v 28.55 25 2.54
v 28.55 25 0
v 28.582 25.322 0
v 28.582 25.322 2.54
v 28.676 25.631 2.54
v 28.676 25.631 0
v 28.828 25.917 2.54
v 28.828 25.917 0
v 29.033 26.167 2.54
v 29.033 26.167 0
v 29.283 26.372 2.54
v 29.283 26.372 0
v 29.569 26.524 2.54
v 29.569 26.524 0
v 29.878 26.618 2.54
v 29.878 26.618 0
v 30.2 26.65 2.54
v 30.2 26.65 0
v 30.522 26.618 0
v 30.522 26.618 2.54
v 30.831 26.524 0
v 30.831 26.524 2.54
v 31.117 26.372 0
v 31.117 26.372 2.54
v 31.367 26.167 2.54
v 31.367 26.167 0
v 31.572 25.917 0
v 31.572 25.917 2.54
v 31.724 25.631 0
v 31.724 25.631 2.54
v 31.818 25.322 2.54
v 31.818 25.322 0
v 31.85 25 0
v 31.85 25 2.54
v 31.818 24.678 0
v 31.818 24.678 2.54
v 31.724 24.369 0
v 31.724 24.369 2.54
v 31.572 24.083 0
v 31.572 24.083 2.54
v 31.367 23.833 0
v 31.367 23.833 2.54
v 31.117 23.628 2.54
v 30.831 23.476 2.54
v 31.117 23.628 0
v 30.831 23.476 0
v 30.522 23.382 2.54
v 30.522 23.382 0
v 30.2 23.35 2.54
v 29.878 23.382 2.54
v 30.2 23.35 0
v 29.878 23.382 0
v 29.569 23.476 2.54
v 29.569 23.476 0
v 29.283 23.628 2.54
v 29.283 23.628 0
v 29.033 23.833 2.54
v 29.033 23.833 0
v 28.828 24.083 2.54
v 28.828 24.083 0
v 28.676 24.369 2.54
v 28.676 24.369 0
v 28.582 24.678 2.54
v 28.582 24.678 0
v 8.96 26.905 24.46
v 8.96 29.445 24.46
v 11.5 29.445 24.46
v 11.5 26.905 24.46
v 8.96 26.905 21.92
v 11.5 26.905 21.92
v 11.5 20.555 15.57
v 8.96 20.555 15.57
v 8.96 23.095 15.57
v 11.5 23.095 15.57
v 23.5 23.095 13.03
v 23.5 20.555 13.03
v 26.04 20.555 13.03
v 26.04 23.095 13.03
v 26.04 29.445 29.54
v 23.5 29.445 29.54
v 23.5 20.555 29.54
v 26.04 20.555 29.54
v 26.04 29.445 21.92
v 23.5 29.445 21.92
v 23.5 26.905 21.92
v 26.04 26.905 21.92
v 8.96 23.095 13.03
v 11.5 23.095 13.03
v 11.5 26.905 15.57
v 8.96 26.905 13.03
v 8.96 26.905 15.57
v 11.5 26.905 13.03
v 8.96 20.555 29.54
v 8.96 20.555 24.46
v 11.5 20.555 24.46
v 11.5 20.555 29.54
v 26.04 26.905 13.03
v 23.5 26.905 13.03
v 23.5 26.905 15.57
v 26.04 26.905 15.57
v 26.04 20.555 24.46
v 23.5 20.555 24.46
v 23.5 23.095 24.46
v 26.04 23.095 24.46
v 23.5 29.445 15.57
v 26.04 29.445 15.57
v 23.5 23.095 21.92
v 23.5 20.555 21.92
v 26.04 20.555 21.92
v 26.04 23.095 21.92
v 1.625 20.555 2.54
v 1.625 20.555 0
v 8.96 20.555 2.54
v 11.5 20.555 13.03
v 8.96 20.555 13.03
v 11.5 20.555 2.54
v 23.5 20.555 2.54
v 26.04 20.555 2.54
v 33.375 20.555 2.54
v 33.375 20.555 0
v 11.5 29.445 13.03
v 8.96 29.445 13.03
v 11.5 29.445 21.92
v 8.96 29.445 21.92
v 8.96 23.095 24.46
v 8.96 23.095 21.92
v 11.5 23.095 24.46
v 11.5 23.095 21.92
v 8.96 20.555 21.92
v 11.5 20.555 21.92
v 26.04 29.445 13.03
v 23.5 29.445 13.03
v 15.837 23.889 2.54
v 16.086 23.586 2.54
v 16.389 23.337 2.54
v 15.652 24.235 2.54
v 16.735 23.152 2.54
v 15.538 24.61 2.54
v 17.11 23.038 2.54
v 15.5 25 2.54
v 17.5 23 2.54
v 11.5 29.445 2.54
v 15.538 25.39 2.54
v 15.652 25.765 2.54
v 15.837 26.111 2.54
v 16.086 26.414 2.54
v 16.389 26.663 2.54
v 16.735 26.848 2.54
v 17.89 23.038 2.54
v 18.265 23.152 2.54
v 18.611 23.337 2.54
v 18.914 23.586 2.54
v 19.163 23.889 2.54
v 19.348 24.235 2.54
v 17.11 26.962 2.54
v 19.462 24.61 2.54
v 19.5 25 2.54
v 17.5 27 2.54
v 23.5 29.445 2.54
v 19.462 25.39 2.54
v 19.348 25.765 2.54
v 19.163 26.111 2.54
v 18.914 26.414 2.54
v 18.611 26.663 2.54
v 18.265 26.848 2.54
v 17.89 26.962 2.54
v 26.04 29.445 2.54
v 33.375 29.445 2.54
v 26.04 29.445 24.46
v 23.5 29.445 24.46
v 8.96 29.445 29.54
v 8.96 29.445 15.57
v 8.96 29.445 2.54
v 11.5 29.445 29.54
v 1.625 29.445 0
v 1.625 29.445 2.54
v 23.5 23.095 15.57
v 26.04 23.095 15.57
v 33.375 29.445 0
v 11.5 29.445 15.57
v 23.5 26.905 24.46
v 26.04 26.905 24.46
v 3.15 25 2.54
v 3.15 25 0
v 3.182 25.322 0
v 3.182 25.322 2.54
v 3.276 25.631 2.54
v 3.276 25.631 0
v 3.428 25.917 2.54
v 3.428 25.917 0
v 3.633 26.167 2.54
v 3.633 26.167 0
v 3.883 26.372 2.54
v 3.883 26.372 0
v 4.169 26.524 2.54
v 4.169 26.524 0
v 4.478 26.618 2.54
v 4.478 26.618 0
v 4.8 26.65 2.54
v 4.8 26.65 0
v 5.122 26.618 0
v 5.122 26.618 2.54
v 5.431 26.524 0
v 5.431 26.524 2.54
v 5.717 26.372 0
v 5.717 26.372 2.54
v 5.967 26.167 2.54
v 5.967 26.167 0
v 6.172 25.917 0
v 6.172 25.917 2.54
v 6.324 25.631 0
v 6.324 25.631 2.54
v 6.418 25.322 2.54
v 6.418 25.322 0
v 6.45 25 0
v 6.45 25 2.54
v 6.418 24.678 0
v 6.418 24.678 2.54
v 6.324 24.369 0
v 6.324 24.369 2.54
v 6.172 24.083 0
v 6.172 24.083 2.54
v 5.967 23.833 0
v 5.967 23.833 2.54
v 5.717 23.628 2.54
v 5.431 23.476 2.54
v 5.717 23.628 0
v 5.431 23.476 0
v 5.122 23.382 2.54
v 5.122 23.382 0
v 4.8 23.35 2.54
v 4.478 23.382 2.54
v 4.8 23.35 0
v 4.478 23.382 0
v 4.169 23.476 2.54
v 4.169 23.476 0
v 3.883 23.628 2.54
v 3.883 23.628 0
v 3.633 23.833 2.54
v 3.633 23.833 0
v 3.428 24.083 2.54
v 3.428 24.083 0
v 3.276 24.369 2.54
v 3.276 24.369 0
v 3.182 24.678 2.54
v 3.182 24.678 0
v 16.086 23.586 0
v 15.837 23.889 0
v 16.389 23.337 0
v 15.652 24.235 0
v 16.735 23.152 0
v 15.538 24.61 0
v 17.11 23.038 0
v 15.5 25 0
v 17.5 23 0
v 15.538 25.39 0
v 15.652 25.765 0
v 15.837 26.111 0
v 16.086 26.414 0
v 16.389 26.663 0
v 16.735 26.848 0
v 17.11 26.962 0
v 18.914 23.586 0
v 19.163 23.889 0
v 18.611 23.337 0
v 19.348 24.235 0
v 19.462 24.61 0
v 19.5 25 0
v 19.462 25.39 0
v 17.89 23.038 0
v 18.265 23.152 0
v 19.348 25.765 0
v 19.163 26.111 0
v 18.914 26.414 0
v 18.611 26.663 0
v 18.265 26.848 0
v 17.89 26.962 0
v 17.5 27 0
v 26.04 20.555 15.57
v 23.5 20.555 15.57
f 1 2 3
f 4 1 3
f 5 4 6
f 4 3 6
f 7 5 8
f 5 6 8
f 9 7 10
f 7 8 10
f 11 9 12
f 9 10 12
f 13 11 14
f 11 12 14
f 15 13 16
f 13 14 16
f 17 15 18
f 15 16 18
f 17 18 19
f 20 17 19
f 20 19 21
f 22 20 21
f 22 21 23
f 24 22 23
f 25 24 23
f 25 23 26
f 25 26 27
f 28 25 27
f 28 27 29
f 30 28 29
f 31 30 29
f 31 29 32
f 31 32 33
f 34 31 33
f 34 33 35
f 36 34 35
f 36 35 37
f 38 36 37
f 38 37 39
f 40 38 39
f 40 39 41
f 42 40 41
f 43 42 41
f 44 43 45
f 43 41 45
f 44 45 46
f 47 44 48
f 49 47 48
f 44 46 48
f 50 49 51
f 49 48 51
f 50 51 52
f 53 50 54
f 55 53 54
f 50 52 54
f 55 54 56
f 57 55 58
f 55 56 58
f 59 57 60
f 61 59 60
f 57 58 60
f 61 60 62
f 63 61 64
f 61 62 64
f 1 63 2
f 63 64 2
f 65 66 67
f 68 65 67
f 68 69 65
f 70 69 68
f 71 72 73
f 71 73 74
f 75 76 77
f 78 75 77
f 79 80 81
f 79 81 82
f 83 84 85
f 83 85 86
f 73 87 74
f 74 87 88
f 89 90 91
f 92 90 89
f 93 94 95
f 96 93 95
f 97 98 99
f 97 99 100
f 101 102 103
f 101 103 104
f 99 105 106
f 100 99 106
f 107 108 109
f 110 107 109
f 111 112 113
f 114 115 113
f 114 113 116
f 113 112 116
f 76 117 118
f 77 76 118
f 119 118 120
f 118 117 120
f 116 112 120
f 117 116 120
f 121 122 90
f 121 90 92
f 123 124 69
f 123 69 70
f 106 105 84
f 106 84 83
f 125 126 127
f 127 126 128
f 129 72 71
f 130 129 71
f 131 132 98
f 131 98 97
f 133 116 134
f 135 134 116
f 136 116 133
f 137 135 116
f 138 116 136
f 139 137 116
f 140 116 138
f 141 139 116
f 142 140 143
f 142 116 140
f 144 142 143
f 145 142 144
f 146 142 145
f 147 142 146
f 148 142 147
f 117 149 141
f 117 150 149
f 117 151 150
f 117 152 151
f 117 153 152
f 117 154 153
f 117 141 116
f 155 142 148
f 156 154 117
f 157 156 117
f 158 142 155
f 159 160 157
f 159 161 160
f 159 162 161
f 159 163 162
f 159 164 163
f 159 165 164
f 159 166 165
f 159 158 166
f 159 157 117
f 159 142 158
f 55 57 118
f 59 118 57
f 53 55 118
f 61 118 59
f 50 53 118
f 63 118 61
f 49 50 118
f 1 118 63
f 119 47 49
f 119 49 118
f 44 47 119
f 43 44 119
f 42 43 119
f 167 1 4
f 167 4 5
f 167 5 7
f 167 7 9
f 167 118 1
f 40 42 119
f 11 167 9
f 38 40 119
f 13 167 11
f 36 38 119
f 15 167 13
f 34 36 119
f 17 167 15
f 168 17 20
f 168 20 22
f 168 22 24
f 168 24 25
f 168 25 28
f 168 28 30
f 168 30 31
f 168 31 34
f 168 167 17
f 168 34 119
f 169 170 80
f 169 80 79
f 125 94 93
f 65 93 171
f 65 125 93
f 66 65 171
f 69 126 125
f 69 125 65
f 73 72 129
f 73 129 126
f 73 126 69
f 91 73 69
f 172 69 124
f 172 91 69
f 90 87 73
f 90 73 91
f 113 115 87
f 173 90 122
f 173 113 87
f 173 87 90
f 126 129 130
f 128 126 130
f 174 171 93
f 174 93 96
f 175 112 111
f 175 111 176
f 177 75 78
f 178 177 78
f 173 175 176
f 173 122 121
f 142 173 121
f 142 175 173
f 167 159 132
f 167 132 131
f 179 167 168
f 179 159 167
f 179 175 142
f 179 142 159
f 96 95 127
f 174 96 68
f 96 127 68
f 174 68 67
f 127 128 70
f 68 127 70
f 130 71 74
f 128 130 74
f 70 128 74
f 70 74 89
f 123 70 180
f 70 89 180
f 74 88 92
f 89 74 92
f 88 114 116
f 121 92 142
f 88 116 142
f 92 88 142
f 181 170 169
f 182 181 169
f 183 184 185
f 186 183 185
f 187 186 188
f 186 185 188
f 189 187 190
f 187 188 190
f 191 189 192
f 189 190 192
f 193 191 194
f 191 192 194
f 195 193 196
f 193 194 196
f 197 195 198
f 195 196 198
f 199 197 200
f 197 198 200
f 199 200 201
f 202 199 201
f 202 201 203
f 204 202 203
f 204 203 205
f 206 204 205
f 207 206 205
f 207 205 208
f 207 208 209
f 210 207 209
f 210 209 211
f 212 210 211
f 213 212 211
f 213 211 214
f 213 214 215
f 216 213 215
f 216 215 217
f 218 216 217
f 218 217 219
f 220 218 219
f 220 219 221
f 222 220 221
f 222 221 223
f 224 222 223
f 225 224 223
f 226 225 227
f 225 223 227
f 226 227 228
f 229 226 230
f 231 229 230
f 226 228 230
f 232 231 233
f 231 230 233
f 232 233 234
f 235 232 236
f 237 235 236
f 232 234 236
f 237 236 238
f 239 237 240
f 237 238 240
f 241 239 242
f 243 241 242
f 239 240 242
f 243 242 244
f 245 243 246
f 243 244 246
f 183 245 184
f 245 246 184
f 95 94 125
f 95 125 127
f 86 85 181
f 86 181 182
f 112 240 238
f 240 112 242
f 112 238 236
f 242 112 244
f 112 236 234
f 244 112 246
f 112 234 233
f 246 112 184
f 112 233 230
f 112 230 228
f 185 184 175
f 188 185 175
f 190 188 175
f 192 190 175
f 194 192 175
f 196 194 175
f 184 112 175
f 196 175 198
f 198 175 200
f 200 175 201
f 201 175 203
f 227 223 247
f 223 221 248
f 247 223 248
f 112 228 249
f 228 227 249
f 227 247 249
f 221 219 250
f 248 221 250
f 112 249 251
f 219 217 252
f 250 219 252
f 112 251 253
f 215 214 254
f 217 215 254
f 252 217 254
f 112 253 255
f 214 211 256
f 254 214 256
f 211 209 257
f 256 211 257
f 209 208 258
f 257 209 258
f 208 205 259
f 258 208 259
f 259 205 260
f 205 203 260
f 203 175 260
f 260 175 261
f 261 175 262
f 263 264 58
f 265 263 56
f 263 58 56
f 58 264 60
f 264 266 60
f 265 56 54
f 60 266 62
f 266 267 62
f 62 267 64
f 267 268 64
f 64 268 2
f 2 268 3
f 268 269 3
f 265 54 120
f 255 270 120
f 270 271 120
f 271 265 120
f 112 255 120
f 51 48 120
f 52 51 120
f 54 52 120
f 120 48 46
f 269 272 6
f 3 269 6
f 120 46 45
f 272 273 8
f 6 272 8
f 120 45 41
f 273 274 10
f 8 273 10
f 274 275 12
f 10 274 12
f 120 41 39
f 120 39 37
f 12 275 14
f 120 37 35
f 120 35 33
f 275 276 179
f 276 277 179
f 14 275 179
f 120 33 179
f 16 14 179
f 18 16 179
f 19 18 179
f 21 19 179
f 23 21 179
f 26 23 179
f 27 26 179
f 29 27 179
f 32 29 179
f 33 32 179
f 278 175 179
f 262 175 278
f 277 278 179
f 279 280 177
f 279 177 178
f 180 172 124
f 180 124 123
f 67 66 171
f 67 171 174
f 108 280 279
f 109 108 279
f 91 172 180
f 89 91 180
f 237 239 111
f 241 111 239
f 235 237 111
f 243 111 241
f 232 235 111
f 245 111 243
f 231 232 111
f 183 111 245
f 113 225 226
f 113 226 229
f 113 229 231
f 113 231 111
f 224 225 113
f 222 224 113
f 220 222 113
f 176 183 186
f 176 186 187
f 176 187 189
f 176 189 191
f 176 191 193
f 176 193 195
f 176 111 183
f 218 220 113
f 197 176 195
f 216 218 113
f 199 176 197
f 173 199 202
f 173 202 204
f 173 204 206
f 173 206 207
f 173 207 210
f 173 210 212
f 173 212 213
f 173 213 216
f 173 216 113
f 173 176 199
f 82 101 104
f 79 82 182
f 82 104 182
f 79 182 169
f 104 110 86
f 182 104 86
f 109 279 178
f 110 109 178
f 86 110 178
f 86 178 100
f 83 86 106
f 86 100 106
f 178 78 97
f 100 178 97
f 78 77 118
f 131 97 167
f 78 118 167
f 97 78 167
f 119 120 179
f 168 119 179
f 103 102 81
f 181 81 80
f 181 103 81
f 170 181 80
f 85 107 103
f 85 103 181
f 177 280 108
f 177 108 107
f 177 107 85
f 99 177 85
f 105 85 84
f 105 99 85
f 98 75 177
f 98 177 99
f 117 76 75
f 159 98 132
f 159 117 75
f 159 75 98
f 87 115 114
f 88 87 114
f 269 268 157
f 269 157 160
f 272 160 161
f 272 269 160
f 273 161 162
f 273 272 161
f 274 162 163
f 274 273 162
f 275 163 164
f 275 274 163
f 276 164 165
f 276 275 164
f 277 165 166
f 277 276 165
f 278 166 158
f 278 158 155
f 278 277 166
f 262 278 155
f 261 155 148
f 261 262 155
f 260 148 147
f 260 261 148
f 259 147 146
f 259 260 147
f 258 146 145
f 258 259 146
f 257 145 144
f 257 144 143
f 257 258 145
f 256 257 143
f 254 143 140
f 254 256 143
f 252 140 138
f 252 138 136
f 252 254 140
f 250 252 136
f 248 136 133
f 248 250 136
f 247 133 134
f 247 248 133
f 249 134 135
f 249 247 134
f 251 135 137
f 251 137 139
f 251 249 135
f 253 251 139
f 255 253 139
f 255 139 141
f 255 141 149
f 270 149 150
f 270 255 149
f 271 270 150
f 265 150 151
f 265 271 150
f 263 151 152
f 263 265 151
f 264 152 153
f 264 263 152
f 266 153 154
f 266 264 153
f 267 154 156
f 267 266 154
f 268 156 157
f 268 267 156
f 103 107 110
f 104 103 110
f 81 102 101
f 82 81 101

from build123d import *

# Parameters (mm, degrees)
SKETCH1_W                   = 31.75
SKETCH1_H                   = 8.89
SKETCH1_R                   = 2
BOSS_EXTRUDE1_DEPTH         = 2.54
SKETCH3_W                   = 2.54
SKETCH3_H                   = 8.89
BOSS_EXTRUDE2_DEPTH         = 27
SKETCH4_W                   = 17.08
SKETCH4_H                   = 2.54
CUT_EXTRUDE1_DEPTH          = 2.54
TAP_DRILL_FOR_M4X0_7_TAP1_D = 3.3


with BuildPart() as part:
    # Sketch1 → Boss-Extrude1 (new body)
    with BuildSketch(Plane.XY):
        with Locations((17.5, 25)):
            Rectangle(SKETCH1_W, SKETCH1_H)
        with Locations((17.5, 25)):
            Circle(SKETCH1_R, mode=Mode.SUBTRACT)
    extrude(amount=BOSS_EXTRUDE1_DEPTH)

    # Sketch3 → Boss-Extrude2 (add)
    with BuildSketch(Plane.XY.offset(2.54)):
        with Locations((10.23, 25)):
            Rectangle(SKETCH3_W, SKETCH3_H)
        with Locations((24.77, 25)):
            Rectangle(SKETCH3_W, SKETCH3_H)
    extrude(amount=BOSS_EXTRUDE2_DEPTH)

    # Sketch4 → Cut-Extrude1 (cut)
    with BuildSketch(Plane(origin=(0, 29.445, 0), x_dir=(1, 0, 0), z_dir=(0, 1, 0))):
        with Locations((17.5, -23.19)):
            Rectangle(SKETCH4_W, SKETCH4_H)
        with Locations((17.5, -14.3)):
            Rectangle(SKETCH4_W, SKETCH4_H)
    cut_extrude1 = extrude(amount=-CUT_EXTRUDE1_DEPTH, mode=Mode.SUBTRACT)

    # Mirror1: Cut-Extrude1 across plane
    add(cut_extrude1.mirror(Plane.ZX.offset(25)), mode=Mode.SUBTRACT)

    # Tap Drill for M4x0.7 Tap1 (through all)
    with Locations(Plane.XY.offset(2.54)):
        with Locations((4.8, 25), (30.2, 25)):
            Hole(TAP_DRILL_FOR_M4X0_7_TAP1_D / 2)


solid = part.part
